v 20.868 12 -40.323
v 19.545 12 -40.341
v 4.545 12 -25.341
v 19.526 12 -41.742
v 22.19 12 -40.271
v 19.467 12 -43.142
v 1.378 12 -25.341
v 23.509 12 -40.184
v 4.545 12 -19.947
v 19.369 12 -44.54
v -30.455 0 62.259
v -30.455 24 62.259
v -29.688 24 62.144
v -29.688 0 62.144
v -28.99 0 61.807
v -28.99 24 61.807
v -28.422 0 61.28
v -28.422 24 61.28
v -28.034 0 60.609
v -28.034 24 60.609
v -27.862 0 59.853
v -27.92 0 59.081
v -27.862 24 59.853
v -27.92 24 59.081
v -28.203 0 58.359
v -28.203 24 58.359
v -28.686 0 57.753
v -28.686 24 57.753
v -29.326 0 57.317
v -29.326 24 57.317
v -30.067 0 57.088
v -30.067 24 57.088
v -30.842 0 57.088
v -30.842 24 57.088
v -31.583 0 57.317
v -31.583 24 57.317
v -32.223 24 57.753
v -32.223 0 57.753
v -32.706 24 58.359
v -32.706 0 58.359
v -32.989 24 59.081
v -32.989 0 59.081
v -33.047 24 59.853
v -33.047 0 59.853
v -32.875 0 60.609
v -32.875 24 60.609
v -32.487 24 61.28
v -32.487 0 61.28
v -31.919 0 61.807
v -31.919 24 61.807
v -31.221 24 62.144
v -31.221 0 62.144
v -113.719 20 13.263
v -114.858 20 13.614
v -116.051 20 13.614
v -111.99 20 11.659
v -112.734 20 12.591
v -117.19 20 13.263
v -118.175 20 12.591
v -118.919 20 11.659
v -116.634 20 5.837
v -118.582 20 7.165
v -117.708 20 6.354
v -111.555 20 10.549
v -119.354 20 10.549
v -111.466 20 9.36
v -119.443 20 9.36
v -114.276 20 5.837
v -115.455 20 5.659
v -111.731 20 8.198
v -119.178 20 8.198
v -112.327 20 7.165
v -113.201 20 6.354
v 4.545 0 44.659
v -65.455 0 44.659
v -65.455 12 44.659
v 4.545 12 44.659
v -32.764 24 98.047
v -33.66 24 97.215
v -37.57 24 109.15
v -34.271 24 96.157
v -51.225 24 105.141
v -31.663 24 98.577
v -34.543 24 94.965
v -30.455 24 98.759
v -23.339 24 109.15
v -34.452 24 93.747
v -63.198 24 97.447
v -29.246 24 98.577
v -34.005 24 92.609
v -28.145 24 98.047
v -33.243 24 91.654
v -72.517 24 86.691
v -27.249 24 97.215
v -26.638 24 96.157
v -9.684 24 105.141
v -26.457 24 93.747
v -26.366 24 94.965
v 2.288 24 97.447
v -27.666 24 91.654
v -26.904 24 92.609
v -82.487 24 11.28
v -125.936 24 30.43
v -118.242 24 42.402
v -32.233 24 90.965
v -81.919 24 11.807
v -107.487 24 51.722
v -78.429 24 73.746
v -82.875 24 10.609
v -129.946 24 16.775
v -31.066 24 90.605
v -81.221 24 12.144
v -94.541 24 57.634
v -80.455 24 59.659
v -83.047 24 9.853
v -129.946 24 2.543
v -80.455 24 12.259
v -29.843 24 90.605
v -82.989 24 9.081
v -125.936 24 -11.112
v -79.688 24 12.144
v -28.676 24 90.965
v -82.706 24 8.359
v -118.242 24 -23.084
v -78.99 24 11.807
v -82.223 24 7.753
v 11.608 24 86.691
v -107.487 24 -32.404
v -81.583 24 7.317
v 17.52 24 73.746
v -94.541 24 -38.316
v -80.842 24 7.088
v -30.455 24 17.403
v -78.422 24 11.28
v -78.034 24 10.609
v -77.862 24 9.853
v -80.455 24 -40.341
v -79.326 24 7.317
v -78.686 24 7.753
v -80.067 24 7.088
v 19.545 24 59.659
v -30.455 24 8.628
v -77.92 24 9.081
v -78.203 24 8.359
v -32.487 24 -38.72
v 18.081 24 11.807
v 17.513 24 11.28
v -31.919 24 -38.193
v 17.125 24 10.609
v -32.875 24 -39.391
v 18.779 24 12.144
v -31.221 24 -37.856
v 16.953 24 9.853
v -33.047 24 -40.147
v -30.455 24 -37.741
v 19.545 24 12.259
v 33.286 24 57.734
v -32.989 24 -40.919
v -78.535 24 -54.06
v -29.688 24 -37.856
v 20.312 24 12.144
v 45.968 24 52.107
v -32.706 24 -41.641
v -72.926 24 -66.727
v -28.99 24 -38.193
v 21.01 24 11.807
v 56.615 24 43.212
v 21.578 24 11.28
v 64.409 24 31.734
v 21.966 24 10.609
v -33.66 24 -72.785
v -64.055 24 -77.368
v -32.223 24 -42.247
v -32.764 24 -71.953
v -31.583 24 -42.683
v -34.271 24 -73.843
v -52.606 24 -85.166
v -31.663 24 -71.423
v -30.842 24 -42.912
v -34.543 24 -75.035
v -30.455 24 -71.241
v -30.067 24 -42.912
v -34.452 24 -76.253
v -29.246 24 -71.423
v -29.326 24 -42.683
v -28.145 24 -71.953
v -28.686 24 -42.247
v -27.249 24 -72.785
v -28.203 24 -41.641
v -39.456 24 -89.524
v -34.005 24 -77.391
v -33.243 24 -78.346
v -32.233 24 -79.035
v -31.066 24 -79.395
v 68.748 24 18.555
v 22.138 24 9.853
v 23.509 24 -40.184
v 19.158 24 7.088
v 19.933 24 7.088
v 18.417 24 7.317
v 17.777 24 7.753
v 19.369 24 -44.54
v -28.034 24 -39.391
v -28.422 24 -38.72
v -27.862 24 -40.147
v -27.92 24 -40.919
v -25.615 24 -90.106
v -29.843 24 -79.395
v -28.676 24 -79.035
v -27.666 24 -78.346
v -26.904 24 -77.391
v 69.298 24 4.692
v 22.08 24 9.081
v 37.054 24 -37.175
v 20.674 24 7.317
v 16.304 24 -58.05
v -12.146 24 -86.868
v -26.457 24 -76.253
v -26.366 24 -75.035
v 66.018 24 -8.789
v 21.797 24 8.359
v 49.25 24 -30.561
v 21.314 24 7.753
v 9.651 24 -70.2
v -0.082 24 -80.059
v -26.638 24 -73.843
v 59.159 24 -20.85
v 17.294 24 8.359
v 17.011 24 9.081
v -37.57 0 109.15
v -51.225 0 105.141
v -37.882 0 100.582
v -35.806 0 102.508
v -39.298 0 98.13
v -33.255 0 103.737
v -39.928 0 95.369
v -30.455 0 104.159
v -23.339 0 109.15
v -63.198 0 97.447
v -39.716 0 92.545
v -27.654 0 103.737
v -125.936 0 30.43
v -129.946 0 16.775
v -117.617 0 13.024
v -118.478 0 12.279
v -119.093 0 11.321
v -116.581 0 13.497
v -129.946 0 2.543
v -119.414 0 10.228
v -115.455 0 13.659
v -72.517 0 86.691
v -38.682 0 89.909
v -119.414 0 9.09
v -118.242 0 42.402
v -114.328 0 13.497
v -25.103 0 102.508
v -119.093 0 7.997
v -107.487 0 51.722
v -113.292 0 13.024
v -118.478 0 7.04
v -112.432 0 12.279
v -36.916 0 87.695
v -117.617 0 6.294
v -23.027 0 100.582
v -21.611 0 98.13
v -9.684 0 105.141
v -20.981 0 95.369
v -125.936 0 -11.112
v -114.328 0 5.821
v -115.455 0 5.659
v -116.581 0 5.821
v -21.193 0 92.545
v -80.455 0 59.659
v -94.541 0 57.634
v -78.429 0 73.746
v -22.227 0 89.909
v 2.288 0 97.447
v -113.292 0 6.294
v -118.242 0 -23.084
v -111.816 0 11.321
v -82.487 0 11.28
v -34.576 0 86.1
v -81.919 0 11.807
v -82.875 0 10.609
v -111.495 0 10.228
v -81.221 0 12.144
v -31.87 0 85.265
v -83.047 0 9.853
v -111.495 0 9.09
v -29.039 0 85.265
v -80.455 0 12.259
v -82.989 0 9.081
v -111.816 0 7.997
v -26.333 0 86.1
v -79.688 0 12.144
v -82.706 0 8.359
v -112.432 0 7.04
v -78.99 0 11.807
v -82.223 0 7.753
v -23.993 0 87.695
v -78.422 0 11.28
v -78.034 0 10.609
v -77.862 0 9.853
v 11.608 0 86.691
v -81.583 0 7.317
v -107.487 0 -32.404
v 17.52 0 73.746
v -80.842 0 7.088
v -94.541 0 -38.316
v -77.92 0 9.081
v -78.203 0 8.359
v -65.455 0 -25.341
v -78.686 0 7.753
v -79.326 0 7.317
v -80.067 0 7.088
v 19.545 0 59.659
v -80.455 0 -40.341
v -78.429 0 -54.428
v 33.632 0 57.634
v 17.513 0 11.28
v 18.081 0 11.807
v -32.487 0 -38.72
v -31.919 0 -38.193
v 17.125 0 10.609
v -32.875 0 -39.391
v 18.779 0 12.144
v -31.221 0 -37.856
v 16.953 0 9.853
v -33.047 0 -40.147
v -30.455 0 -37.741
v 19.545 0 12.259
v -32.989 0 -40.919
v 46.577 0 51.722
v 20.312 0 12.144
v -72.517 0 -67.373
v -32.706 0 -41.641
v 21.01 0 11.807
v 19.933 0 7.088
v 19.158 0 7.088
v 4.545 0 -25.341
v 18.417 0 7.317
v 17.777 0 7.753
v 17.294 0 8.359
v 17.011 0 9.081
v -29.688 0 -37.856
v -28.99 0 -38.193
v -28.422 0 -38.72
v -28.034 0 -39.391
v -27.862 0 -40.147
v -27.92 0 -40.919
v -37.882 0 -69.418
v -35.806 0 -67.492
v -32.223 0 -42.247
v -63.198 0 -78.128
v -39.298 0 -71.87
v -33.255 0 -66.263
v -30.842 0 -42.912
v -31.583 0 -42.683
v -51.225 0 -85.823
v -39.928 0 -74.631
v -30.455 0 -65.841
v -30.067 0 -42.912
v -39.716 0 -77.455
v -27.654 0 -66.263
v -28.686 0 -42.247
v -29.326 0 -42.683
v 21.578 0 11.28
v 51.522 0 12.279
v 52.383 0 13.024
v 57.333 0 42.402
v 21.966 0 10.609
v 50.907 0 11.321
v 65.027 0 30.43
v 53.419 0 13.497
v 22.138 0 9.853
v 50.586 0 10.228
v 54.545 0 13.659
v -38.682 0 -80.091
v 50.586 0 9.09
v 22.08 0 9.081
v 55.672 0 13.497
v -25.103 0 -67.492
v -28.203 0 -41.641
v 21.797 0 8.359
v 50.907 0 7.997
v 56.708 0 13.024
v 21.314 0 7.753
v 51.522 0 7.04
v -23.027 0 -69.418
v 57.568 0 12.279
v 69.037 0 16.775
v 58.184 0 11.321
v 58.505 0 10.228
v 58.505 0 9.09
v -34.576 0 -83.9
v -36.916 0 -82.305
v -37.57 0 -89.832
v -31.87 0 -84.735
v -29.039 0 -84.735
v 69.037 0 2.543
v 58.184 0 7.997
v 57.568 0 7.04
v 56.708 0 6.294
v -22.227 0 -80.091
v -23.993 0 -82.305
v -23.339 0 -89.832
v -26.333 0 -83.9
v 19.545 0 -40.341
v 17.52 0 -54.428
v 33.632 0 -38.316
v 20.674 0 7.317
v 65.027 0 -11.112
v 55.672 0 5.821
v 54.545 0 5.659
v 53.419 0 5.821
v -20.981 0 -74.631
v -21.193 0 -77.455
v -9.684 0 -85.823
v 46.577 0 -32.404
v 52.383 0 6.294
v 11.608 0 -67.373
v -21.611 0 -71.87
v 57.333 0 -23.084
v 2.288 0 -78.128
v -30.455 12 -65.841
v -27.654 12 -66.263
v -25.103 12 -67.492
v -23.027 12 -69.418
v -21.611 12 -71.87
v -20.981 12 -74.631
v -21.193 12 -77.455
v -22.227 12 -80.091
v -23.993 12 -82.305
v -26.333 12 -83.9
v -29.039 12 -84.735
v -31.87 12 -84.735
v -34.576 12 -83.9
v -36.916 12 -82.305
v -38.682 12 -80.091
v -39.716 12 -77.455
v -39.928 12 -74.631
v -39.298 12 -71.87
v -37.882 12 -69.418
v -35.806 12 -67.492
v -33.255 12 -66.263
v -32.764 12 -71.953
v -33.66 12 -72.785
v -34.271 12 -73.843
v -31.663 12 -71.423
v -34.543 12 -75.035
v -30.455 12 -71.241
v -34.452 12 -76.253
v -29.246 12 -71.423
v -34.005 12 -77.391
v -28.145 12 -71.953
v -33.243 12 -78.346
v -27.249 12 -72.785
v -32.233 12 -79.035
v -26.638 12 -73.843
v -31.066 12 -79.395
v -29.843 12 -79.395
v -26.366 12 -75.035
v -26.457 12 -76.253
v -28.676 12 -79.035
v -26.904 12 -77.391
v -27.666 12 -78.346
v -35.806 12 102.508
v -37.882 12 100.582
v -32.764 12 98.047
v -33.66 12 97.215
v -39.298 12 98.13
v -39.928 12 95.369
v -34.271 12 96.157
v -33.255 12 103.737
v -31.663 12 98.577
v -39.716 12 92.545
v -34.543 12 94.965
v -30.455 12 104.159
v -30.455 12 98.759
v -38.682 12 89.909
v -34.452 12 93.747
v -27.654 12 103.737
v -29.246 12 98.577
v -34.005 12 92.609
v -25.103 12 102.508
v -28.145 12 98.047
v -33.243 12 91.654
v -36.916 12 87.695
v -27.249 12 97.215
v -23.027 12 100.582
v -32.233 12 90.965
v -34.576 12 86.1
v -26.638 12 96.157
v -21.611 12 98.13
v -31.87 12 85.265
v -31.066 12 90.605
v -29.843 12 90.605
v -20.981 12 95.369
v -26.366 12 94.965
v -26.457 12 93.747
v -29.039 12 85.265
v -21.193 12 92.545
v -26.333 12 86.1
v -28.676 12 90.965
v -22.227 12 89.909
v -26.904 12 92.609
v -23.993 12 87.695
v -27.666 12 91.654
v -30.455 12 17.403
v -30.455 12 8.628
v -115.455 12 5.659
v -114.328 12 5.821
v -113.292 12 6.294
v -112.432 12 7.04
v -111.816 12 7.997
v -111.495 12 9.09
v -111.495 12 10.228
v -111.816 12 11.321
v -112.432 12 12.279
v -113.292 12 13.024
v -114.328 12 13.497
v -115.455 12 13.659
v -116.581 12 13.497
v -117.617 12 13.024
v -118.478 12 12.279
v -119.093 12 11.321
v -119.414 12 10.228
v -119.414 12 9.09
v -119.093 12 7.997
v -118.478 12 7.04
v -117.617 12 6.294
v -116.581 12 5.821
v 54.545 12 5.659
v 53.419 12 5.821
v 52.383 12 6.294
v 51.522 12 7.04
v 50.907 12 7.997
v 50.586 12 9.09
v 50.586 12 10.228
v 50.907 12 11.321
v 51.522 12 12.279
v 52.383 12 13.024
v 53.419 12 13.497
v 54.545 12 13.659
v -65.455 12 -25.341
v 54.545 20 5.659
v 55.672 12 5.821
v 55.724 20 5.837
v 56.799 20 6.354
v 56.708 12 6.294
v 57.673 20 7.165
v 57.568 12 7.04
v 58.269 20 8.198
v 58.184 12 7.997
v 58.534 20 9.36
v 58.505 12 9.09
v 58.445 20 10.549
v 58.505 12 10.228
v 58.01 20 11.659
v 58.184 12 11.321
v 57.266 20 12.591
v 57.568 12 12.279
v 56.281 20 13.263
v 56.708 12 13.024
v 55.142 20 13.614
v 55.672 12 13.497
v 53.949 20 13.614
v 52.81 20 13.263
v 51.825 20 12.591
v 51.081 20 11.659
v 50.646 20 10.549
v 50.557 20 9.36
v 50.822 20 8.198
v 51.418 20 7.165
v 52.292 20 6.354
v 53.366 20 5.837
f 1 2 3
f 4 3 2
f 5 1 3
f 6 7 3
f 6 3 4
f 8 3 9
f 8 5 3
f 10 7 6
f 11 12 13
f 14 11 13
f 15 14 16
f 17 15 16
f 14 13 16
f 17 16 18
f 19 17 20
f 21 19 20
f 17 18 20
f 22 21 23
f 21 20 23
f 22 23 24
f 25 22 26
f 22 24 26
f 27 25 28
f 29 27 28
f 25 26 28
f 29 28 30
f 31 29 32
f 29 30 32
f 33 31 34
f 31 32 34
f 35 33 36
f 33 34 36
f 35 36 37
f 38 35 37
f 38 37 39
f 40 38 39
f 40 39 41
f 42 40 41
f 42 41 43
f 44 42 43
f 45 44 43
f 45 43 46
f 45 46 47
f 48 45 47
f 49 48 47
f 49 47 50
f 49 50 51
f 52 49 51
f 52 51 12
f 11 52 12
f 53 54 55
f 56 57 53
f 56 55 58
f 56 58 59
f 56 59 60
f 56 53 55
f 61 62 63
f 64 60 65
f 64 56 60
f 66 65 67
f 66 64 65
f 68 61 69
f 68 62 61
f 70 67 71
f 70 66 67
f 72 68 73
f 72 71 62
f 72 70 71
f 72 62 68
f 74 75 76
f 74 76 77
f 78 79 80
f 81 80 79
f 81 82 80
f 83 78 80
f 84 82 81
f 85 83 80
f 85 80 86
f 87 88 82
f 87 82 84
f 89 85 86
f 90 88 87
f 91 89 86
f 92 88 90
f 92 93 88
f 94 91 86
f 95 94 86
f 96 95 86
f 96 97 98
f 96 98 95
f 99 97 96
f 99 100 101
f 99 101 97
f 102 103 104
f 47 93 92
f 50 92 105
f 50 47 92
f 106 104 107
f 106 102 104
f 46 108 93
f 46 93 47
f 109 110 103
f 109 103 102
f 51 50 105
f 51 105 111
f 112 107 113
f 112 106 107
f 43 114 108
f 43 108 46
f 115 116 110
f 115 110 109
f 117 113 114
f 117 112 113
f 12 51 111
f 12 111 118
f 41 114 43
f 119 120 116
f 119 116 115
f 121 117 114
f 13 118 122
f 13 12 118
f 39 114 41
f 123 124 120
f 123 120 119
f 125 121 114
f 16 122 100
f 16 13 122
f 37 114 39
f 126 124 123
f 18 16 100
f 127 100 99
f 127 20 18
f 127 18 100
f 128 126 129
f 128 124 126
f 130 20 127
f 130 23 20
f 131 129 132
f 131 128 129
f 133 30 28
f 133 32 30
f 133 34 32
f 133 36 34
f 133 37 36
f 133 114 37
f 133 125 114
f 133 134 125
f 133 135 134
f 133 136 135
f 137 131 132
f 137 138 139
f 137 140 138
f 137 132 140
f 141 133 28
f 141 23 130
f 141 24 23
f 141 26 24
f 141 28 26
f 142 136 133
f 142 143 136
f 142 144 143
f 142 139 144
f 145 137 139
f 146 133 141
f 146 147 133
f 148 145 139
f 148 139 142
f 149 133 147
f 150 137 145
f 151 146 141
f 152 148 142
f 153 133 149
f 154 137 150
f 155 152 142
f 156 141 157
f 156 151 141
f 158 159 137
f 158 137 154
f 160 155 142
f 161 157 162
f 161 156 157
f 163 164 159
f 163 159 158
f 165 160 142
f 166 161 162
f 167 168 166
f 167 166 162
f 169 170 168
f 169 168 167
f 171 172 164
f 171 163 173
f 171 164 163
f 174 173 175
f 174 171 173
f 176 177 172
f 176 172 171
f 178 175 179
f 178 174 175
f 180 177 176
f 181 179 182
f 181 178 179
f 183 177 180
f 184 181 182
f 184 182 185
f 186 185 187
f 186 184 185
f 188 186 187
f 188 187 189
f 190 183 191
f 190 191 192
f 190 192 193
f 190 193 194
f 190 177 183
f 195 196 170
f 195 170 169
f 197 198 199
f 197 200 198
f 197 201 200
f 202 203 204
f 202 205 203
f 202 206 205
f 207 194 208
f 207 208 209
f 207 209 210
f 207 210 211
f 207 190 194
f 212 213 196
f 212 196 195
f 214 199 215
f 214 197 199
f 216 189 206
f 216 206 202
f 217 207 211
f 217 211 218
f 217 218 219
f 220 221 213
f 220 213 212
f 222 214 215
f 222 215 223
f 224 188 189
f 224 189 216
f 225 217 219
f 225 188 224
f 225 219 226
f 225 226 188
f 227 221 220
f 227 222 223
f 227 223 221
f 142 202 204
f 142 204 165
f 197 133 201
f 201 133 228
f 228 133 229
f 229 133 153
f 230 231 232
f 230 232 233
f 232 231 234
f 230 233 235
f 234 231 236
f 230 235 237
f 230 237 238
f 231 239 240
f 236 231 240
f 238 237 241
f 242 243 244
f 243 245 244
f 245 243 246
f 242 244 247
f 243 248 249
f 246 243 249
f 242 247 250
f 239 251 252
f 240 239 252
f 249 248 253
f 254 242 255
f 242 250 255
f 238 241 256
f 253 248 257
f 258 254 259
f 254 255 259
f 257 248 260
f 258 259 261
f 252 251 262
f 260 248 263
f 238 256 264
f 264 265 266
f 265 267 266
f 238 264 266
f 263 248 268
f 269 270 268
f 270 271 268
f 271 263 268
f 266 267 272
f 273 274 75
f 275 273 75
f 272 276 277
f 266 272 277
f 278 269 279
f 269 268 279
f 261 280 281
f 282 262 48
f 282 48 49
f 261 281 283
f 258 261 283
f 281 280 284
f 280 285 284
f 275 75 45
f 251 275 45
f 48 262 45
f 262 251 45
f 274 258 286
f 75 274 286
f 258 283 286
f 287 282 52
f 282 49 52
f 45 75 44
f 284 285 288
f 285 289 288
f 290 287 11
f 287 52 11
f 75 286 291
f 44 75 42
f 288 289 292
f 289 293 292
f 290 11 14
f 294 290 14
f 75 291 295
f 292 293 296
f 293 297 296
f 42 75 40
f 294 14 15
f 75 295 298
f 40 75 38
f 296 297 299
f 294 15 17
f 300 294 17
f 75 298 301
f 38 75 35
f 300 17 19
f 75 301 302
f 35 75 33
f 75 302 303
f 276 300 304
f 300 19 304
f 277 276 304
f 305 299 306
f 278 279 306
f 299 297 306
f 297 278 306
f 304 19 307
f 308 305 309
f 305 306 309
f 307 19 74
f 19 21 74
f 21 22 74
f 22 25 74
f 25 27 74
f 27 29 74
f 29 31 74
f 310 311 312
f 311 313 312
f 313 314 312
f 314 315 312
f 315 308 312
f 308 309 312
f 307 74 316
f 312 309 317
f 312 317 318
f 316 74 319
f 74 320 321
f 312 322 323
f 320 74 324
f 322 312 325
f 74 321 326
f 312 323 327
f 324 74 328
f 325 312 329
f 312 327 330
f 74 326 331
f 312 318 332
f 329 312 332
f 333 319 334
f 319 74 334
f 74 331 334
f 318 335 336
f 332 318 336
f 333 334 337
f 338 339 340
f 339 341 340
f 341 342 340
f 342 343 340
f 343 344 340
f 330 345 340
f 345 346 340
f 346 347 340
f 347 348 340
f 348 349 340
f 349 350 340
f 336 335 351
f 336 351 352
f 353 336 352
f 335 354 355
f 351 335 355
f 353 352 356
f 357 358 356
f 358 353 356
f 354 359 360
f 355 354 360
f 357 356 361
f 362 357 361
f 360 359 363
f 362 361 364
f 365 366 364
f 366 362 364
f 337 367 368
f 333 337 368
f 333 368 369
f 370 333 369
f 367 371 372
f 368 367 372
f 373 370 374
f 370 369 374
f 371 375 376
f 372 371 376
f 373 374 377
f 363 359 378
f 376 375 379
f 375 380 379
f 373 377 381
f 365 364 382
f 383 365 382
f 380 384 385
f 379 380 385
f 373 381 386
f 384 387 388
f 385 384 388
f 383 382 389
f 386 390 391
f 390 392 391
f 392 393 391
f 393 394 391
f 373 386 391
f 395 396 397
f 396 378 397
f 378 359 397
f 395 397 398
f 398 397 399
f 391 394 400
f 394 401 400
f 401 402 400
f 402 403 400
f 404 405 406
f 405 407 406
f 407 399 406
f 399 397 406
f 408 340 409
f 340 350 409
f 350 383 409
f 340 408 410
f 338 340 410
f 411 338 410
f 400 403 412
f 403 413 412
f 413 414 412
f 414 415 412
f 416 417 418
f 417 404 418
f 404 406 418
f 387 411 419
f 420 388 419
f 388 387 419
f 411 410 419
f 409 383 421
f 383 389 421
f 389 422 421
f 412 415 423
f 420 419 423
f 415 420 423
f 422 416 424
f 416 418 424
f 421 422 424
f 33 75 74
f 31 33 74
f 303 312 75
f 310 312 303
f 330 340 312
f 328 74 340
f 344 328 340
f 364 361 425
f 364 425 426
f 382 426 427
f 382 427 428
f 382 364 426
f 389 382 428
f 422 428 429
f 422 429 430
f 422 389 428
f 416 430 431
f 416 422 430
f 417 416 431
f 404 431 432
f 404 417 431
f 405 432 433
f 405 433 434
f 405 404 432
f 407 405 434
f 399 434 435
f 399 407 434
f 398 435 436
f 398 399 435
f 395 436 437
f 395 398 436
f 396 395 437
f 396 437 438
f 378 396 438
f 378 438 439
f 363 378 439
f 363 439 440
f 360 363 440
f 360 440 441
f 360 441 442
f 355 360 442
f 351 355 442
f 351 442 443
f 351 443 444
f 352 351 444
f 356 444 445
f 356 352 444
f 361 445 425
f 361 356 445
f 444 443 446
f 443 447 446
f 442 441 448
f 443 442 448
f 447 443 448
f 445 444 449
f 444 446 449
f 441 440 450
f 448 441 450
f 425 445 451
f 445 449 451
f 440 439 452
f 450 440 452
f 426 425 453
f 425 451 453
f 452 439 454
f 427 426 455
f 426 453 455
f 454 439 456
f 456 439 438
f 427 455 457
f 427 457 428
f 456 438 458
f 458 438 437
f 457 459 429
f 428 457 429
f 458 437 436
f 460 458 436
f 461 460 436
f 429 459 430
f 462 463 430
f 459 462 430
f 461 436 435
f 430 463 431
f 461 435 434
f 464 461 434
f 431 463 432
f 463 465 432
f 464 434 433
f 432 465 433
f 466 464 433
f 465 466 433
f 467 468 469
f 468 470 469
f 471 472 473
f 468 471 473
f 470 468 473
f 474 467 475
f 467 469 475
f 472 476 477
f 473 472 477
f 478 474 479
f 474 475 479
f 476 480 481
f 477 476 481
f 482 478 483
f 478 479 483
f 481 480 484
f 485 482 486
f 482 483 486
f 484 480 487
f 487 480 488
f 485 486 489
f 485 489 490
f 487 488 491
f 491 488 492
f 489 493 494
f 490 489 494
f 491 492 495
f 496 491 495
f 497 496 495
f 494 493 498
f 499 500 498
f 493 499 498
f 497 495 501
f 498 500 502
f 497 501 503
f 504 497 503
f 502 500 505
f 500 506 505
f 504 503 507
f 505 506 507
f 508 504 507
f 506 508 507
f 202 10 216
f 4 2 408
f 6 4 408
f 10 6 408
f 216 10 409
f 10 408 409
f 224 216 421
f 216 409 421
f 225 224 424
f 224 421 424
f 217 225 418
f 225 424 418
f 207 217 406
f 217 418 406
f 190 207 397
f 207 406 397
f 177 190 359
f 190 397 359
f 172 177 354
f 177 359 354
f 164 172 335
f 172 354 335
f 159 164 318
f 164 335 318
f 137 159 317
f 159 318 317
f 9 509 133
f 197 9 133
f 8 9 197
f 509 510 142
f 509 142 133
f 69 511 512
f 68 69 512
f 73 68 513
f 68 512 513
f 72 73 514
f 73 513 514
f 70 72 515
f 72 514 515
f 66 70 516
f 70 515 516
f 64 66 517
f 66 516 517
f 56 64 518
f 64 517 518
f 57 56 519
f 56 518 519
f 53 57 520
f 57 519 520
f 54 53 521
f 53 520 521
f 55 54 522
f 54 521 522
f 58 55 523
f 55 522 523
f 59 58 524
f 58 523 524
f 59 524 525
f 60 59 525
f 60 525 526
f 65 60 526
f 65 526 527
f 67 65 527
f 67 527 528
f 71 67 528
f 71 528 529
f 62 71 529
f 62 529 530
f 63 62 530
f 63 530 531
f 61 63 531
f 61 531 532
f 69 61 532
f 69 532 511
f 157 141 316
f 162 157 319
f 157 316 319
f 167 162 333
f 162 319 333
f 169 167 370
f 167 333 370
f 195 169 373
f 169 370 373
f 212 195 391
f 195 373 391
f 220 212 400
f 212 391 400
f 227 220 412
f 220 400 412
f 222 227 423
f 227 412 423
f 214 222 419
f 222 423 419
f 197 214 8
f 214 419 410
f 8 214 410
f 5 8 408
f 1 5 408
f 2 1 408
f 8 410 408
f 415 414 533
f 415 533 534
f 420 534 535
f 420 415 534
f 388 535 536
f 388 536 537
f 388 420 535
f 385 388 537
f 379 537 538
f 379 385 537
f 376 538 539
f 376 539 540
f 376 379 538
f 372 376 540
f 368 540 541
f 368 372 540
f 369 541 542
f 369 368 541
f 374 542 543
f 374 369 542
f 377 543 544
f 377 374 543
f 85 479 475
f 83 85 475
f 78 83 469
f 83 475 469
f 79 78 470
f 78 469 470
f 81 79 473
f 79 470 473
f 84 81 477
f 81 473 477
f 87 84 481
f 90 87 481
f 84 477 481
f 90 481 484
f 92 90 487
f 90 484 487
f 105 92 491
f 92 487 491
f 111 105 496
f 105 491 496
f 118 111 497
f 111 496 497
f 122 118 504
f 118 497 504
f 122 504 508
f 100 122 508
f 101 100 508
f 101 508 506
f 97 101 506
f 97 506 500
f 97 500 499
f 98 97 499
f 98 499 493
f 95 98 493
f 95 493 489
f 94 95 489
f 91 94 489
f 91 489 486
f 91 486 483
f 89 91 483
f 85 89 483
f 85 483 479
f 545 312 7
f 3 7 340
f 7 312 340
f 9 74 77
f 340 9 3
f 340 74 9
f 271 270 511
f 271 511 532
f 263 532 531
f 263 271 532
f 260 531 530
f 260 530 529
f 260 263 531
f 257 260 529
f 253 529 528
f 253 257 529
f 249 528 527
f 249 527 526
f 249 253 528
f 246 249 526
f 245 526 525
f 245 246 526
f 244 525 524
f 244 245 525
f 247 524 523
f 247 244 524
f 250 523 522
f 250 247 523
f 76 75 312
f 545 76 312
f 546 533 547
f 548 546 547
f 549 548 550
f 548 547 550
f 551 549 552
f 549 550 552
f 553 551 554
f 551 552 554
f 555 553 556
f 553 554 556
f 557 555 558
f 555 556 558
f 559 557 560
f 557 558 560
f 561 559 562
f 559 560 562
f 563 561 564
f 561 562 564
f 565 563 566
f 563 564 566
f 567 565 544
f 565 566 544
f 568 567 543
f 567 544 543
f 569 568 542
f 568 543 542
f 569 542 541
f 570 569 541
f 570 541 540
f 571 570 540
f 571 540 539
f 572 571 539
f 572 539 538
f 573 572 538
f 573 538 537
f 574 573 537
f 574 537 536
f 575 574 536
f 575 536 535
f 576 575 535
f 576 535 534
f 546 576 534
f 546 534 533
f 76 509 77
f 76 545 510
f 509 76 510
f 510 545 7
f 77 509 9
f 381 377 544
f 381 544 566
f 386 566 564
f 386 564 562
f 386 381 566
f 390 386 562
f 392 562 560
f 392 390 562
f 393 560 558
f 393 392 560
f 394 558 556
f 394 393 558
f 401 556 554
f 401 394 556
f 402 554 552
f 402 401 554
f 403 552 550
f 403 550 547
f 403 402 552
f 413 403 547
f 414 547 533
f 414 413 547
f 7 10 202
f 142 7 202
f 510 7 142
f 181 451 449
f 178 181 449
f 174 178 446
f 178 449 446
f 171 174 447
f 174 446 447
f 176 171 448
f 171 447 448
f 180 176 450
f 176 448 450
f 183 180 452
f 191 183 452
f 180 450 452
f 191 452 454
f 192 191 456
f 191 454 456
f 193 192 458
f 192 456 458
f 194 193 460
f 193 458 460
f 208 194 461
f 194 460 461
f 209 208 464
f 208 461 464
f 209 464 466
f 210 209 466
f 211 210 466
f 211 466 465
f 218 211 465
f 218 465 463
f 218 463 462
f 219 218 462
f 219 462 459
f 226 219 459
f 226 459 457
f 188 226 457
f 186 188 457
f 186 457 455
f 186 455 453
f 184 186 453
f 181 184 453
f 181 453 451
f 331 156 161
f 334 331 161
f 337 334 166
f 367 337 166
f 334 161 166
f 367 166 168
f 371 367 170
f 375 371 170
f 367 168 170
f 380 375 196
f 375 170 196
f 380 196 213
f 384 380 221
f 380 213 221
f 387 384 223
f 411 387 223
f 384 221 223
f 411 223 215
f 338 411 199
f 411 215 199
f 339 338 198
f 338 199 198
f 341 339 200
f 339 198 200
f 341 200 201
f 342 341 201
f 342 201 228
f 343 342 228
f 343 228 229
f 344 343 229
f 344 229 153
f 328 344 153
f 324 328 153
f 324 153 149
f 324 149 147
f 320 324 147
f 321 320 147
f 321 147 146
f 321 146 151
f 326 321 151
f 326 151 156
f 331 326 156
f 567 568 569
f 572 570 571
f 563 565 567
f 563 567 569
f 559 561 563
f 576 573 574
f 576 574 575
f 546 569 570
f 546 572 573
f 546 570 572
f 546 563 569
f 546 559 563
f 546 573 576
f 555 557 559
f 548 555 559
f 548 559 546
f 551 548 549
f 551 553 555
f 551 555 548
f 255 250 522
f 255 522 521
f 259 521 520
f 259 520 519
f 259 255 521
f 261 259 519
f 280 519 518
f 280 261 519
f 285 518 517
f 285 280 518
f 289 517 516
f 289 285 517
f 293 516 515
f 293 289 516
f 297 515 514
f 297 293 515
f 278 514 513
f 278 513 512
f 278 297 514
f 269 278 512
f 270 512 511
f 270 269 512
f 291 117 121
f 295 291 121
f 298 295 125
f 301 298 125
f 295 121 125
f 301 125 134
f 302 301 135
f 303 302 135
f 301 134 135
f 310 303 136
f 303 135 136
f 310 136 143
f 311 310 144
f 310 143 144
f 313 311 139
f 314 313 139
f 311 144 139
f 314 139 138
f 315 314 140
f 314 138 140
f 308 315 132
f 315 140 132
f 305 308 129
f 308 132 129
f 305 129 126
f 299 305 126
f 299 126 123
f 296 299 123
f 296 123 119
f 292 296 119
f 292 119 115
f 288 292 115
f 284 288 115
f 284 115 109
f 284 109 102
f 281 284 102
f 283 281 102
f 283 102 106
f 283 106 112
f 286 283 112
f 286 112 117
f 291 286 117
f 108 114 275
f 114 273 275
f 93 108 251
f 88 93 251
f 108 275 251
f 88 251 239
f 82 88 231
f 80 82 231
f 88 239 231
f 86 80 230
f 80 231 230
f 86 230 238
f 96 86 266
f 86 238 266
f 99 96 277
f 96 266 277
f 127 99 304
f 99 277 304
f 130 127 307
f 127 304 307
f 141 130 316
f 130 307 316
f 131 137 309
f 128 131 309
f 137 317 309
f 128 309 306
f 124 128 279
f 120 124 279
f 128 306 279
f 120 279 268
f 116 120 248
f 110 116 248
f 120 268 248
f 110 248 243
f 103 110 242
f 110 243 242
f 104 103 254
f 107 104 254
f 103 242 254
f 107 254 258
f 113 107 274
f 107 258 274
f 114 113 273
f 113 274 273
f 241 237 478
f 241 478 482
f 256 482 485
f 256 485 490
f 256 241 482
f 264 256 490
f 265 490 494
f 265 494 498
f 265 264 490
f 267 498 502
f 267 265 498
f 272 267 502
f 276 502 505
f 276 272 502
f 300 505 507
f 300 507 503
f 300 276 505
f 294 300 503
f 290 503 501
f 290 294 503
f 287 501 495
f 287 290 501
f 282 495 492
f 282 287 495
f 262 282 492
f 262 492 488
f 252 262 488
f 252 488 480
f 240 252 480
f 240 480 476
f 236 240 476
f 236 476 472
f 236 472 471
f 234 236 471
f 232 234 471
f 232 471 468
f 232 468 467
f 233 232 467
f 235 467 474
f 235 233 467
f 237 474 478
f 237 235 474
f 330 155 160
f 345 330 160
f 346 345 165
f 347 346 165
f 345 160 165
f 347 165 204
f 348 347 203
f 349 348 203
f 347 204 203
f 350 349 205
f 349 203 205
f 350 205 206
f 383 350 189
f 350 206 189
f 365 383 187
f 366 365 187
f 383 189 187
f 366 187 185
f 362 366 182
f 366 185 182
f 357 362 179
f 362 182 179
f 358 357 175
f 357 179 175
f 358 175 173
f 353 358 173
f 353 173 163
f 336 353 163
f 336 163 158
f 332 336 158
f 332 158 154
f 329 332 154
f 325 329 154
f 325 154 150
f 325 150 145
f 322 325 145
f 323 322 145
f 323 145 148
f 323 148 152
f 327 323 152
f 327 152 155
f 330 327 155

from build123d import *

# Parameters (mm, degrees)
IZIM1_R                              = 9.5
IZIM1_R_2                            = 4
IZIM1_W                              = 70
IZIM1_H                              = 70
Y_KSEKLIK_EKSTR_ZYON1_DEPTH          = 12
Y_KSEKLIK_EKSTR_ZYON2_DEPTH          = 12
KES_EKSTR_ZYON1_START                = -12
KES_EKSTR_ZYON1_DEPTH                = 12
IZIM6_R                              = 4
KES_EKSTR_ZYON4_DEPTH                = 20
M5_HELISARMAL_I_IN_Z_VANA_MATKAB_1_D = 5.2
IZIM9_R                              = 4.1
KES_EKSTR_ZYON5_DEPTH                = 50


with BuildPart() as part:
    # Çizim1 → Yükseklik-Ekstrüzyon1 (new body)
    with BuildSketch(Plane(origin=(0, 0, 0), x_dir=(1, 0, 0), z_dir=(0, 1, 0))):
        with BuildLine():
            ThreePointArc((19.545454545, 40.340909091), (-30.454545455, 90.340909091), (-80.454545455, 40.340909091))
            ThreePointArc((-80.454545455, 40.340909091), (-130.454545455, -9.659090909), (-80.454545455, -59.659090909))
            ThreePointArc((-80.454545455, -59.659090909), (-30.454545455, -109.659090909), (19.545454545, -59.659090909))
            ThreePointArc((19.545454545, -59.659090909), (69.545454545, -9.659090909), (19.545454545, 40.340909091))
        make_face()
        with Locations(Location((-30.454545455, -94.659090909, 0), (0, 0, 270))):
            Circle(IZIM1_R, mode=Mode.SUBTRACT)
        with Locations(Location((-30.454545455, 75.340909091, 0), (0, 0, 270))):
            Circle(IZIM1_R, mode=Mode.SUBTRACT)
        with Locations(Location((54.545454545, -9.659090909, 0), (0, 0, 270))):
            Circle(IZIM1_R_2, mode=Mode.SUBTRACT)
        with Locations(Location((-115.454545455, -9.659090909, 0), (0, 0, 270))):
            Circle(IZIM1_R_2, mode=Mode.SUBTRACT)
        with Locations((-30.454545455, -9.659090909)):
            Rectangle(IZIM1_W, IZIM1_H, mode=Mode.SUBTRACT)
    extrude(amount=Y_KSEKLIK_EKSTR_ZYON1_DEPTH)

    # Çizim2 → Yükseklik-Ekstrüzyon2 (add)
    with BuildSketch(Plane(origin=(0, 12, 0), x_dir=(1, 0, 0), z_dir=(0, 1, 0))):
        with BuildLine():
            ThreePointArc((19.545454545, 40.340909091), (-30.454545455, 90.340909091), (-80.454545455, 40.340909091))
            ThreePointArc((-80.454545455, 40.340909091), (-130.454545455, -9.659090909), (-80.454545455, -59.659090909))
            ThreePointArc((-80.454545455, -59.659090909), (-30.454545455, -109.659090909), (19.545454545, -59.659090909))
            ThreePointArc((19.545454545, -59.659090909), (69.545454545, -9.659090909), (19.545454545, 40.340909091))
        make_face()
    extrude(amount=Y_KSEKLIK_EKSTR_ZYON2_DEPTH)

    # Çizim3 → Kes-Ekstrüzyon1 (cut)
    with BuildSketch(Plane(origin=(0, 24, 0), x_dir=(1, 0, 0), z_dir=(0, 1, 0)).offset(KES_EKSTR_ZYON1_START)):
        with BuildLine():
            Line((-30.454545455, -8.628204493), (-30.454545455, -17.402914961))
            Line((-30.454545455, -17.402914961), (23.509344434, 40.183537201))
            ThreePointArc((23.509344434, 40.183537201), (21.528960845, 40.301550628), (19.545454545, 40.340909091))
            ThreePointArc((19.545454545, 40.340909091), (19.501280543, 42.442206057), (19.368836588, 44.539790114))
            Line((19.368836588, 44.539790114), (-30.454545455, -8.628204493))
        make_face()
    extrude(amount=KES_EKSTR_ZYON1_DEPTH, mode=Mode.SUBTRACT)

    # Çizim6 → Kes-Ekstrüzyon4 (cut)
    with BuildSketch(Plane.XZ):
        with Locations(Location((-115.454545455, 9.659090909, 0), (0, 0, 270))):
            Circle(IZIM6_R)
        with Locations(Location((54.545454545, 9.659090909, 0), (0, 0, 270))):
            Circle(IZIM6_R)
    extrude(amount=-KES_EKSTR_ZYON4_DEPTH, mode=Mode.SUBTRACT)

    # M5 Helisarmal için Zıvana matkabı1 (through all)
    with Locations(Plane(origin=(-80.454545455, 0, 9.659090909), x_dir=(0, 0, -1), z_dir=(0, -1, 0))):
        with Locations((0, 0), (-50, 50), (0, 100), (50, 50)):
            Hole(M5_HELISARMAL_I_IN_Z_VANA_MATKAB_1_D / 2)

    # Çizim9 → Kes-Ekstrüzyon5 (cut)
    with BuildSketch(Plane.XZ):
        with Locations(Location((-30.454545455, 94.659090909, 0), (0, 0, 90))):
            Circle(IZIM9_R)
        with Locations(Location((-30.454545455, -75.340909091, 0), (0, 0, 90))):
            Circle(IZIM9_R)
    extrude(amount=-KES_EKSTR_ZYON5_DEPTH, mode=Mode.SUBTRACT)


solid = part.part
